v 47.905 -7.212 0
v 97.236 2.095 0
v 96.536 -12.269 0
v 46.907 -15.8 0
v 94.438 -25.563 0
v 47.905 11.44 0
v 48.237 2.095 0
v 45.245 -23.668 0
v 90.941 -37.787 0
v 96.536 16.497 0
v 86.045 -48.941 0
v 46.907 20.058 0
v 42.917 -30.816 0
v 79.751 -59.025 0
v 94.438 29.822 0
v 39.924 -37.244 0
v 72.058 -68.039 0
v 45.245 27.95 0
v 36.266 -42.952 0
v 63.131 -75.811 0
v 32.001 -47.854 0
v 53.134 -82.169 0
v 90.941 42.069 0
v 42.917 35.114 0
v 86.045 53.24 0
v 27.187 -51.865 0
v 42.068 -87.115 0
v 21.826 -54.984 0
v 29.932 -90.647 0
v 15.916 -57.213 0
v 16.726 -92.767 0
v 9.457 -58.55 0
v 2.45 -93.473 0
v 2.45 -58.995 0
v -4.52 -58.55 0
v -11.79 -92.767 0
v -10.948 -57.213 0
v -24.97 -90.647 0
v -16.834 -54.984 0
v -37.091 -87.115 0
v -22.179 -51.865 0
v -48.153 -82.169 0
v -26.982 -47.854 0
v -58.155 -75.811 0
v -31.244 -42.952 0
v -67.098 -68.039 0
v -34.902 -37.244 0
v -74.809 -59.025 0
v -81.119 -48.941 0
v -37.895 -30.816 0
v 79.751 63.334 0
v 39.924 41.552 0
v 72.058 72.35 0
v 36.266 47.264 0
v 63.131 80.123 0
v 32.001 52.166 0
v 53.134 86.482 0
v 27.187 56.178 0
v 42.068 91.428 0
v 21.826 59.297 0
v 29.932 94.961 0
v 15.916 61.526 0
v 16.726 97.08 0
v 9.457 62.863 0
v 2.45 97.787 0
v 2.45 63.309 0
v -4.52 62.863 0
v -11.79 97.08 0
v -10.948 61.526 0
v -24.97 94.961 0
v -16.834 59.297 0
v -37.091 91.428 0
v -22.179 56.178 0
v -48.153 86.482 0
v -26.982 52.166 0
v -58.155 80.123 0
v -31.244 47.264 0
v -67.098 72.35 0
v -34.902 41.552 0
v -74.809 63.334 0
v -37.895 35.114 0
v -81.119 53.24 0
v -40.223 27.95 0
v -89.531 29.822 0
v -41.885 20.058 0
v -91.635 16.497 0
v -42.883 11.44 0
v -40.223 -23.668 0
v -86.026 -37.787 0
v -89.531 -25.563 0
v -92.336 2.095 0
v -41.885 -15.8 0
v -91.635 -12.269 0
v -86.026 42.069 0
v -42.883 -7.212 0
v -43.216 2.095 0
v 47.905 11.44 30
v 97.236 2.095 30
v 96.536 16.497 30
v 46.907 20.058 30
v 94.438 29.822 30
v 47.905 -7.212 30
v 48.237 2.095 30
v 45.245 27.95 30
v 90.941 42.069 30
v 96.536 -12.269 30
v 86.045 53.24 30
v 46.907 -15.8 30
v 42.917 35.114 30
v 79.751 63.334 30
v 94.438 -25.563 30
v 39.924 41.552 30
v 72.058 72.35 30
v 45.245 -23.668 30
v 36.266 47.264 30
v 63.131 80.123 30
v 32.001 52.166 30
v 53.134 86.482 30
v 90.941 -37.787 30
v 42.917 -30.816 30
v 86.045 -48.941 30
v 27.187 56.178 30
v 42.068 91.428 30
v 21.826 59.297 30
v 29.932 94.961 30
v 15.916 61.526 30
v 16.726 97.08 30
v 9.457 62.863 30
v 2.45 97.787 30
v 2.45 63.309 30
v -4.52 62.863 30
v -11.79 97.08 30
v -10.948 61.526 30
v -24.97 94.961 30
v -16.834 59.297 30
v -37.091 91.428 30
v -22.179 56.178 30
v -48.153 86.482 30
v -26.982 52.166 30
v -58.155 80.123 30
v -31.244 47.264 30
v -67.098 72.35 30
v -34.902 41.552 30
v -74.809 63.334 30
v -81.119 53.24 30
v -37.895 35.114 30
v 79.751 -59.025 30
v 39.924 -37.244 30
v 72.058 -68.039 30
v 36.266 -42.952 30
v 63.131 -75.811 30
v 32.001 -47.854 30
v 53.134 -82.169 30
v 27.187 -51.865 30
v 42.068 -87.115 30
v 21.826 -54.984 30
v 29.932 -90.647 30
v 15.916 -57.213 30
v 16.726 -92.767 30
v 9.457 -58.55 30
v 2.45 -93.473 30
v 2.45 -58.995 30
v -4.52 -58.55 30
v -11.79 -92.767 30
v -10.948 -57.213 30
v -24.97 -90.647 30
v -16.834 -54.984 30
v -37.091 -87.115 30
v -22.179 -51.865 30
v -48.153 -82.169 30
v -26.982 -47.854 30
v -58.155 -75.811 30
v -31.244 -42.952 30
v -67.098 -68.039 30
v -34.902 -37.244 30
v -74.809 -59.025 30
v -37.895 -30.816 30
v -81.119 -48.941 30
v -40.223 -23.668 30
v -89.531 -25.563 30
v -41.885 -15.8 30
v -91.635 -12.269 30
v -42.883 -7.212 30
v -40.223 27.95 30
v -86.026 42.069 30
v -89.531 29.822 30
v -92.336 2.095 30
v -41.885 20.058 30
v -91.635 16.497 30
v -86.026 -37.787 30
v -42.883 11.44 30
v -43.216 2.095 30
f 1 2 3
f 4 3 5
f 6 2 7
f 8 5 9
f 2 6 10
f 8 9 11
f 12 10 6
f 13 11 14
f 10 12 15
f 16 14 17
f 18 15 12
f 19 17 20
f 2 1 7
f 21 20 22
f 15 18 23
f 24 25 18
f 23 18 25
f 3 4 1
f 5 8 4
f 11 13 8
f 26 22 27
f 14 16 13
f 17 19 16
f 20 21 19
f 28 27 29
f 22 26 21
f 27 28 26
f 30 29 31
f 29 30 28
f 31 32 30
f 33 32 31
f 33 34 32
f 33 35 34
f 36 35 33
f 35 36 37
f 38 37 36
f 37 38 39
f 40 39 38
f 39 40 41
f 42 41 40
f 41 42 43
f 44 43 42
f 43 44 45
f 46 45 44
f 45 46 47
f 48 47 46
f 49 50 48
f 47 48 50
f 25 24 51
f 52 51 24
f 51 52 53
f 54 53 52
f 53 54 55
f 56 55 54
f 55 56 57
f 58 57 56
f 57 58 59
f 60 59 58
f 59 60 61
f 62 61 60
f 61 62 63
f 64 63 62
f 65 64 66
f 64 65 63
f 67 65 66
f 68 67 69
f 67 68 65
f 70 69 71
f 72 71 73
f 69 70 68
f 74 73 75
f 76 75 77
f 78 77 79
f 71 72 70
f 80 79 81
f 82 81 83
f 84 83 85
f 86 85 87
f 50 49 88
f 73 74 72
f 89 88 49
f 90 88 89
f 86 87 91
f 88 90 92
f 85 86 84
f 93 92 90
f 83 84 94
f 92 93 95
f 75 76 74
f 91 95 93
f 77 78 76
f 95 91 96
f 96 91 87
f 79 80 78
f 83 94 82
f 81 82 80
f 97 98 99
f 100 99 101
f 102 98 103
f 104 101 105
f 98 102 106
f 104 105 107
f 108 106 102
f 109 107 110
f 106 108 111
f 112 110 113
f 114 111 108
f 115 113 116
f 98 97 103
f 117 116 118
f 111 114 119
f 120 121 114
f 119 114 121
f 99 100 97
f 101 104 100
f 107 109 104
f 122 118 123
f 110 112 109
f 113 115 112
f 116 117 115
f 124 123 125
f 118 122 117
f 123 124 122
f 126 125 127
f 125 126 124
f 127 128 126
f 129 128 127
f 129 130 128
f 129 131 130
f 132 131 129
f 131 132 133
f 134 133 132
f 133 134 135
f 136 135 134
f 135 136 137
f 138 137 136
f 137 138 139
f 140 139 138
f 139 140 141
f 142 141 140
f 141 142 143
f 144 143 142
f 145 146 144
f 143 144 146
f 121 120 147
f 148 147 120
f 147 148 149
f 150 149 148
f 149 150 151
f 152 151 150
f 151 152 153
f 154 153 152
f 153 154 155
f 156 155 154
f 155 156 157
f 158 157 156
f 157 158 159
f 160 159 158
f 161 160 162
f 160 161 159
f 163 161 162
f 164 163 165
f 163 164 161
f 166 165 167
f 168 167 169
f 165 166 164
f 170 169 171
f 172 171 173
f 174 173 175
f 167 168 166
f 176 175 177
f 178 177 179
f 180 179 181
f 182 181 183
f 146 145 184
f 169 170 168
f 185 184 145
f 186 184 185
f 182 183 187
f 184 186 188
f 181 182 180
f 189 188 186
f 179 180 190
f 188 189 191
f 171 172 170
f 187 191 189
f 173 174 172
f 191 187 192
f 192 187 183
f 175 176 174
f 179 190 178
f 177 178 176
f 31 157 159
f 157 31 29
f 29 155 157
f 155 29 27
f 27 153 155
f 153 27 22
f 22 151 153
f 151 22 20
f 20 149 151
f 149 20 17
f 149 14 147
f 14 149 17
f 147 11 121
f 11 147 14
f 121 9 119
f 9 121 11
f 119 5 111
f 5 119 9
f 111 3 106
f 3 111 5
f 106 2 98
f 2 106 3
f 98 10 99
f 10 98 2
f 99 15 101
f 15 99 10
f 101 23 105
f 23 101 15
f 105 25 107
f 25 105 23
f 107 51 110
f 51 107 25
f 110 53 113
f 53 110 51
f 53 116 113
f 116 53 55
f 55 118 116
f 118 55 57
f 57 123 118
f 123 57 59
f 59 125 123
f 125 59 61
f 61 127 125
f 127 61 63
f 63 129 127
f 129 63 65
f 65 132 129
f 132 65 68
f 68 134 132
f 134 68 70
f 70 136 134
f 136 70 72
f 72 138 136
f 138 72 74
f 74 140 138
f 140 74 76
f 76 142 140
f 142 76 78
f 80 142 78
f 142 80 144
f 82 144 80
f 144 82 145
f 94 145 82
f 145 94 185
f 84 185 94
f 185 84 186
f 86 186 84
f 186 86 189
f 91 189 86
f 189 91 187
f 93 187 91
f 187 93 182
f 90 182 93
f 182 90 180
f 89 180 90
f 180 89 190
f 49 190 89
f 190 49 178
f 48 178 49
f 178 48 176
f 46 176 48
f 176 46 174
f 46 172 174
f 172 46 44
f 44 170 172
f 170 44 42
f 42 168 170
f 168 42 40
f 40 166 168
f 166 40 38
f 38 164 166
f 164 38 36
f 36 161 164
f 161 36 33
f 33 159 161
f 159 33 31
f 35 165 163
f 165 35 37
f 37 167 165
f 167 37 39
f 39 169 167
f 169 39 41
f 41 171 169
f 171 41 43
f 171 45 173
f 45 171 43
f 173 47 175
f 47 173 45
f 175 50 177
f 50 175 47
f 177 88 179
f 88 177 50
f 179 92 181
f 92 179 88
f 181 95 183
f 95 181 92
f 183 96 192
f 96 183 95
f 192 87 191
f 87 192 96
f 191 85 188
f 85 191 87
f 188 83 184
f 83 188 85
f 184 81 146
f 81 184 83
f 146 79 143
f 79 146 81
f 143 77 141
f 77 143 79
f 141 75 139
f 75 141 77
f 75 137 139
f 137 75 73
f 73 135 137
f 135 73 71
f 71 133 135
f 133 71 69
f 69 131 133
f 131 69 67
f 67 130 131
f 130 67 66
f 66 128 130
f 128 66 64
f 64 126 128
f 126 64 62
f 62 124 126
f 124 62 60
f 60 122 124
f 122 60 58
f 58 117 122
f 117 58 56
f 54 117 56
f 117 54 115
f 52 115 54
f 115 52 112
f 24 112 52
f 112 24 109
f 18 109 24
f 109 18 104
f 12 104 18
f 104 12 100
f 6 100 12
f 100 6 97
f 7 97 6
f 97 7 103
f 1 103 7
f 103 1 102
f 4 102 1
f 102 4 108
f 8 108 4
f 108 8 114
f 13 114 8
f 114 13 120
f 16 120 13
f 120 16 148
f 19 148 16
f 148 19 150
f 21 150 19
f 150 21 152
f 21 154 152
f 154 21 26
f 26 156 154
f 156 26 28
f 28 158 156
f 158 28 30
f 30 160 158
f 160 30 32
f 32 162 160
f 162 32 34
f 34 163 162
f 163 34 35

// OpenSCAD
// Logotipo COW AI - Letra O (Relieve 30mm)
// Diseñado para impresión en Bambu Lab P1S (Cara frontal hacia abajo en cama PEI)


$fn = 40;

// Keyhole hanger pocket for wall mounting (face-down printing: rear is at z=depth)
module keyhole_pocket(depth = 30) {
    translate([0, 0, depth - 7]) {
        // Screw head insertion pocket (9mm dia, 7.2mm deep)
        cylinder(d = 9.0, h = 7.2);
        
        // Internal slide channel for screw head (9mm wide, 12mm high, 4mm deep)
        translate([-4.5, 0, 0]) cube([9.0, 12.0, 4.0]);
        translate([0, 12, 0]) cylinder(d = 9.0, h = 4.0);
        
        // Screw shank slot to the wall surface (4.6mm wide, 12mm high, 3.2mm deep)
        translate([-2.3, 0, 4.0]) cube([4.6, 12.0, 3.2]);
        translate([0, 12, 4.0]) cylinder(d = 4.6, h = 3.2);
    }
}


difference() {
    // Letra extruida 30mm
    linear_extrude(height = 30, convexity = 10)
        text("O", font = "Ubuntu:style=Bold", size = 182, halign = "center", valign = "center");
        
    // Alojamientos traseros para anclaje a pared
    translate([0, 45, 0]) keyhole_pocket(depth = 30);
    translate([0, -45, 0]) keyhole_pocket(depth = 30);
}
